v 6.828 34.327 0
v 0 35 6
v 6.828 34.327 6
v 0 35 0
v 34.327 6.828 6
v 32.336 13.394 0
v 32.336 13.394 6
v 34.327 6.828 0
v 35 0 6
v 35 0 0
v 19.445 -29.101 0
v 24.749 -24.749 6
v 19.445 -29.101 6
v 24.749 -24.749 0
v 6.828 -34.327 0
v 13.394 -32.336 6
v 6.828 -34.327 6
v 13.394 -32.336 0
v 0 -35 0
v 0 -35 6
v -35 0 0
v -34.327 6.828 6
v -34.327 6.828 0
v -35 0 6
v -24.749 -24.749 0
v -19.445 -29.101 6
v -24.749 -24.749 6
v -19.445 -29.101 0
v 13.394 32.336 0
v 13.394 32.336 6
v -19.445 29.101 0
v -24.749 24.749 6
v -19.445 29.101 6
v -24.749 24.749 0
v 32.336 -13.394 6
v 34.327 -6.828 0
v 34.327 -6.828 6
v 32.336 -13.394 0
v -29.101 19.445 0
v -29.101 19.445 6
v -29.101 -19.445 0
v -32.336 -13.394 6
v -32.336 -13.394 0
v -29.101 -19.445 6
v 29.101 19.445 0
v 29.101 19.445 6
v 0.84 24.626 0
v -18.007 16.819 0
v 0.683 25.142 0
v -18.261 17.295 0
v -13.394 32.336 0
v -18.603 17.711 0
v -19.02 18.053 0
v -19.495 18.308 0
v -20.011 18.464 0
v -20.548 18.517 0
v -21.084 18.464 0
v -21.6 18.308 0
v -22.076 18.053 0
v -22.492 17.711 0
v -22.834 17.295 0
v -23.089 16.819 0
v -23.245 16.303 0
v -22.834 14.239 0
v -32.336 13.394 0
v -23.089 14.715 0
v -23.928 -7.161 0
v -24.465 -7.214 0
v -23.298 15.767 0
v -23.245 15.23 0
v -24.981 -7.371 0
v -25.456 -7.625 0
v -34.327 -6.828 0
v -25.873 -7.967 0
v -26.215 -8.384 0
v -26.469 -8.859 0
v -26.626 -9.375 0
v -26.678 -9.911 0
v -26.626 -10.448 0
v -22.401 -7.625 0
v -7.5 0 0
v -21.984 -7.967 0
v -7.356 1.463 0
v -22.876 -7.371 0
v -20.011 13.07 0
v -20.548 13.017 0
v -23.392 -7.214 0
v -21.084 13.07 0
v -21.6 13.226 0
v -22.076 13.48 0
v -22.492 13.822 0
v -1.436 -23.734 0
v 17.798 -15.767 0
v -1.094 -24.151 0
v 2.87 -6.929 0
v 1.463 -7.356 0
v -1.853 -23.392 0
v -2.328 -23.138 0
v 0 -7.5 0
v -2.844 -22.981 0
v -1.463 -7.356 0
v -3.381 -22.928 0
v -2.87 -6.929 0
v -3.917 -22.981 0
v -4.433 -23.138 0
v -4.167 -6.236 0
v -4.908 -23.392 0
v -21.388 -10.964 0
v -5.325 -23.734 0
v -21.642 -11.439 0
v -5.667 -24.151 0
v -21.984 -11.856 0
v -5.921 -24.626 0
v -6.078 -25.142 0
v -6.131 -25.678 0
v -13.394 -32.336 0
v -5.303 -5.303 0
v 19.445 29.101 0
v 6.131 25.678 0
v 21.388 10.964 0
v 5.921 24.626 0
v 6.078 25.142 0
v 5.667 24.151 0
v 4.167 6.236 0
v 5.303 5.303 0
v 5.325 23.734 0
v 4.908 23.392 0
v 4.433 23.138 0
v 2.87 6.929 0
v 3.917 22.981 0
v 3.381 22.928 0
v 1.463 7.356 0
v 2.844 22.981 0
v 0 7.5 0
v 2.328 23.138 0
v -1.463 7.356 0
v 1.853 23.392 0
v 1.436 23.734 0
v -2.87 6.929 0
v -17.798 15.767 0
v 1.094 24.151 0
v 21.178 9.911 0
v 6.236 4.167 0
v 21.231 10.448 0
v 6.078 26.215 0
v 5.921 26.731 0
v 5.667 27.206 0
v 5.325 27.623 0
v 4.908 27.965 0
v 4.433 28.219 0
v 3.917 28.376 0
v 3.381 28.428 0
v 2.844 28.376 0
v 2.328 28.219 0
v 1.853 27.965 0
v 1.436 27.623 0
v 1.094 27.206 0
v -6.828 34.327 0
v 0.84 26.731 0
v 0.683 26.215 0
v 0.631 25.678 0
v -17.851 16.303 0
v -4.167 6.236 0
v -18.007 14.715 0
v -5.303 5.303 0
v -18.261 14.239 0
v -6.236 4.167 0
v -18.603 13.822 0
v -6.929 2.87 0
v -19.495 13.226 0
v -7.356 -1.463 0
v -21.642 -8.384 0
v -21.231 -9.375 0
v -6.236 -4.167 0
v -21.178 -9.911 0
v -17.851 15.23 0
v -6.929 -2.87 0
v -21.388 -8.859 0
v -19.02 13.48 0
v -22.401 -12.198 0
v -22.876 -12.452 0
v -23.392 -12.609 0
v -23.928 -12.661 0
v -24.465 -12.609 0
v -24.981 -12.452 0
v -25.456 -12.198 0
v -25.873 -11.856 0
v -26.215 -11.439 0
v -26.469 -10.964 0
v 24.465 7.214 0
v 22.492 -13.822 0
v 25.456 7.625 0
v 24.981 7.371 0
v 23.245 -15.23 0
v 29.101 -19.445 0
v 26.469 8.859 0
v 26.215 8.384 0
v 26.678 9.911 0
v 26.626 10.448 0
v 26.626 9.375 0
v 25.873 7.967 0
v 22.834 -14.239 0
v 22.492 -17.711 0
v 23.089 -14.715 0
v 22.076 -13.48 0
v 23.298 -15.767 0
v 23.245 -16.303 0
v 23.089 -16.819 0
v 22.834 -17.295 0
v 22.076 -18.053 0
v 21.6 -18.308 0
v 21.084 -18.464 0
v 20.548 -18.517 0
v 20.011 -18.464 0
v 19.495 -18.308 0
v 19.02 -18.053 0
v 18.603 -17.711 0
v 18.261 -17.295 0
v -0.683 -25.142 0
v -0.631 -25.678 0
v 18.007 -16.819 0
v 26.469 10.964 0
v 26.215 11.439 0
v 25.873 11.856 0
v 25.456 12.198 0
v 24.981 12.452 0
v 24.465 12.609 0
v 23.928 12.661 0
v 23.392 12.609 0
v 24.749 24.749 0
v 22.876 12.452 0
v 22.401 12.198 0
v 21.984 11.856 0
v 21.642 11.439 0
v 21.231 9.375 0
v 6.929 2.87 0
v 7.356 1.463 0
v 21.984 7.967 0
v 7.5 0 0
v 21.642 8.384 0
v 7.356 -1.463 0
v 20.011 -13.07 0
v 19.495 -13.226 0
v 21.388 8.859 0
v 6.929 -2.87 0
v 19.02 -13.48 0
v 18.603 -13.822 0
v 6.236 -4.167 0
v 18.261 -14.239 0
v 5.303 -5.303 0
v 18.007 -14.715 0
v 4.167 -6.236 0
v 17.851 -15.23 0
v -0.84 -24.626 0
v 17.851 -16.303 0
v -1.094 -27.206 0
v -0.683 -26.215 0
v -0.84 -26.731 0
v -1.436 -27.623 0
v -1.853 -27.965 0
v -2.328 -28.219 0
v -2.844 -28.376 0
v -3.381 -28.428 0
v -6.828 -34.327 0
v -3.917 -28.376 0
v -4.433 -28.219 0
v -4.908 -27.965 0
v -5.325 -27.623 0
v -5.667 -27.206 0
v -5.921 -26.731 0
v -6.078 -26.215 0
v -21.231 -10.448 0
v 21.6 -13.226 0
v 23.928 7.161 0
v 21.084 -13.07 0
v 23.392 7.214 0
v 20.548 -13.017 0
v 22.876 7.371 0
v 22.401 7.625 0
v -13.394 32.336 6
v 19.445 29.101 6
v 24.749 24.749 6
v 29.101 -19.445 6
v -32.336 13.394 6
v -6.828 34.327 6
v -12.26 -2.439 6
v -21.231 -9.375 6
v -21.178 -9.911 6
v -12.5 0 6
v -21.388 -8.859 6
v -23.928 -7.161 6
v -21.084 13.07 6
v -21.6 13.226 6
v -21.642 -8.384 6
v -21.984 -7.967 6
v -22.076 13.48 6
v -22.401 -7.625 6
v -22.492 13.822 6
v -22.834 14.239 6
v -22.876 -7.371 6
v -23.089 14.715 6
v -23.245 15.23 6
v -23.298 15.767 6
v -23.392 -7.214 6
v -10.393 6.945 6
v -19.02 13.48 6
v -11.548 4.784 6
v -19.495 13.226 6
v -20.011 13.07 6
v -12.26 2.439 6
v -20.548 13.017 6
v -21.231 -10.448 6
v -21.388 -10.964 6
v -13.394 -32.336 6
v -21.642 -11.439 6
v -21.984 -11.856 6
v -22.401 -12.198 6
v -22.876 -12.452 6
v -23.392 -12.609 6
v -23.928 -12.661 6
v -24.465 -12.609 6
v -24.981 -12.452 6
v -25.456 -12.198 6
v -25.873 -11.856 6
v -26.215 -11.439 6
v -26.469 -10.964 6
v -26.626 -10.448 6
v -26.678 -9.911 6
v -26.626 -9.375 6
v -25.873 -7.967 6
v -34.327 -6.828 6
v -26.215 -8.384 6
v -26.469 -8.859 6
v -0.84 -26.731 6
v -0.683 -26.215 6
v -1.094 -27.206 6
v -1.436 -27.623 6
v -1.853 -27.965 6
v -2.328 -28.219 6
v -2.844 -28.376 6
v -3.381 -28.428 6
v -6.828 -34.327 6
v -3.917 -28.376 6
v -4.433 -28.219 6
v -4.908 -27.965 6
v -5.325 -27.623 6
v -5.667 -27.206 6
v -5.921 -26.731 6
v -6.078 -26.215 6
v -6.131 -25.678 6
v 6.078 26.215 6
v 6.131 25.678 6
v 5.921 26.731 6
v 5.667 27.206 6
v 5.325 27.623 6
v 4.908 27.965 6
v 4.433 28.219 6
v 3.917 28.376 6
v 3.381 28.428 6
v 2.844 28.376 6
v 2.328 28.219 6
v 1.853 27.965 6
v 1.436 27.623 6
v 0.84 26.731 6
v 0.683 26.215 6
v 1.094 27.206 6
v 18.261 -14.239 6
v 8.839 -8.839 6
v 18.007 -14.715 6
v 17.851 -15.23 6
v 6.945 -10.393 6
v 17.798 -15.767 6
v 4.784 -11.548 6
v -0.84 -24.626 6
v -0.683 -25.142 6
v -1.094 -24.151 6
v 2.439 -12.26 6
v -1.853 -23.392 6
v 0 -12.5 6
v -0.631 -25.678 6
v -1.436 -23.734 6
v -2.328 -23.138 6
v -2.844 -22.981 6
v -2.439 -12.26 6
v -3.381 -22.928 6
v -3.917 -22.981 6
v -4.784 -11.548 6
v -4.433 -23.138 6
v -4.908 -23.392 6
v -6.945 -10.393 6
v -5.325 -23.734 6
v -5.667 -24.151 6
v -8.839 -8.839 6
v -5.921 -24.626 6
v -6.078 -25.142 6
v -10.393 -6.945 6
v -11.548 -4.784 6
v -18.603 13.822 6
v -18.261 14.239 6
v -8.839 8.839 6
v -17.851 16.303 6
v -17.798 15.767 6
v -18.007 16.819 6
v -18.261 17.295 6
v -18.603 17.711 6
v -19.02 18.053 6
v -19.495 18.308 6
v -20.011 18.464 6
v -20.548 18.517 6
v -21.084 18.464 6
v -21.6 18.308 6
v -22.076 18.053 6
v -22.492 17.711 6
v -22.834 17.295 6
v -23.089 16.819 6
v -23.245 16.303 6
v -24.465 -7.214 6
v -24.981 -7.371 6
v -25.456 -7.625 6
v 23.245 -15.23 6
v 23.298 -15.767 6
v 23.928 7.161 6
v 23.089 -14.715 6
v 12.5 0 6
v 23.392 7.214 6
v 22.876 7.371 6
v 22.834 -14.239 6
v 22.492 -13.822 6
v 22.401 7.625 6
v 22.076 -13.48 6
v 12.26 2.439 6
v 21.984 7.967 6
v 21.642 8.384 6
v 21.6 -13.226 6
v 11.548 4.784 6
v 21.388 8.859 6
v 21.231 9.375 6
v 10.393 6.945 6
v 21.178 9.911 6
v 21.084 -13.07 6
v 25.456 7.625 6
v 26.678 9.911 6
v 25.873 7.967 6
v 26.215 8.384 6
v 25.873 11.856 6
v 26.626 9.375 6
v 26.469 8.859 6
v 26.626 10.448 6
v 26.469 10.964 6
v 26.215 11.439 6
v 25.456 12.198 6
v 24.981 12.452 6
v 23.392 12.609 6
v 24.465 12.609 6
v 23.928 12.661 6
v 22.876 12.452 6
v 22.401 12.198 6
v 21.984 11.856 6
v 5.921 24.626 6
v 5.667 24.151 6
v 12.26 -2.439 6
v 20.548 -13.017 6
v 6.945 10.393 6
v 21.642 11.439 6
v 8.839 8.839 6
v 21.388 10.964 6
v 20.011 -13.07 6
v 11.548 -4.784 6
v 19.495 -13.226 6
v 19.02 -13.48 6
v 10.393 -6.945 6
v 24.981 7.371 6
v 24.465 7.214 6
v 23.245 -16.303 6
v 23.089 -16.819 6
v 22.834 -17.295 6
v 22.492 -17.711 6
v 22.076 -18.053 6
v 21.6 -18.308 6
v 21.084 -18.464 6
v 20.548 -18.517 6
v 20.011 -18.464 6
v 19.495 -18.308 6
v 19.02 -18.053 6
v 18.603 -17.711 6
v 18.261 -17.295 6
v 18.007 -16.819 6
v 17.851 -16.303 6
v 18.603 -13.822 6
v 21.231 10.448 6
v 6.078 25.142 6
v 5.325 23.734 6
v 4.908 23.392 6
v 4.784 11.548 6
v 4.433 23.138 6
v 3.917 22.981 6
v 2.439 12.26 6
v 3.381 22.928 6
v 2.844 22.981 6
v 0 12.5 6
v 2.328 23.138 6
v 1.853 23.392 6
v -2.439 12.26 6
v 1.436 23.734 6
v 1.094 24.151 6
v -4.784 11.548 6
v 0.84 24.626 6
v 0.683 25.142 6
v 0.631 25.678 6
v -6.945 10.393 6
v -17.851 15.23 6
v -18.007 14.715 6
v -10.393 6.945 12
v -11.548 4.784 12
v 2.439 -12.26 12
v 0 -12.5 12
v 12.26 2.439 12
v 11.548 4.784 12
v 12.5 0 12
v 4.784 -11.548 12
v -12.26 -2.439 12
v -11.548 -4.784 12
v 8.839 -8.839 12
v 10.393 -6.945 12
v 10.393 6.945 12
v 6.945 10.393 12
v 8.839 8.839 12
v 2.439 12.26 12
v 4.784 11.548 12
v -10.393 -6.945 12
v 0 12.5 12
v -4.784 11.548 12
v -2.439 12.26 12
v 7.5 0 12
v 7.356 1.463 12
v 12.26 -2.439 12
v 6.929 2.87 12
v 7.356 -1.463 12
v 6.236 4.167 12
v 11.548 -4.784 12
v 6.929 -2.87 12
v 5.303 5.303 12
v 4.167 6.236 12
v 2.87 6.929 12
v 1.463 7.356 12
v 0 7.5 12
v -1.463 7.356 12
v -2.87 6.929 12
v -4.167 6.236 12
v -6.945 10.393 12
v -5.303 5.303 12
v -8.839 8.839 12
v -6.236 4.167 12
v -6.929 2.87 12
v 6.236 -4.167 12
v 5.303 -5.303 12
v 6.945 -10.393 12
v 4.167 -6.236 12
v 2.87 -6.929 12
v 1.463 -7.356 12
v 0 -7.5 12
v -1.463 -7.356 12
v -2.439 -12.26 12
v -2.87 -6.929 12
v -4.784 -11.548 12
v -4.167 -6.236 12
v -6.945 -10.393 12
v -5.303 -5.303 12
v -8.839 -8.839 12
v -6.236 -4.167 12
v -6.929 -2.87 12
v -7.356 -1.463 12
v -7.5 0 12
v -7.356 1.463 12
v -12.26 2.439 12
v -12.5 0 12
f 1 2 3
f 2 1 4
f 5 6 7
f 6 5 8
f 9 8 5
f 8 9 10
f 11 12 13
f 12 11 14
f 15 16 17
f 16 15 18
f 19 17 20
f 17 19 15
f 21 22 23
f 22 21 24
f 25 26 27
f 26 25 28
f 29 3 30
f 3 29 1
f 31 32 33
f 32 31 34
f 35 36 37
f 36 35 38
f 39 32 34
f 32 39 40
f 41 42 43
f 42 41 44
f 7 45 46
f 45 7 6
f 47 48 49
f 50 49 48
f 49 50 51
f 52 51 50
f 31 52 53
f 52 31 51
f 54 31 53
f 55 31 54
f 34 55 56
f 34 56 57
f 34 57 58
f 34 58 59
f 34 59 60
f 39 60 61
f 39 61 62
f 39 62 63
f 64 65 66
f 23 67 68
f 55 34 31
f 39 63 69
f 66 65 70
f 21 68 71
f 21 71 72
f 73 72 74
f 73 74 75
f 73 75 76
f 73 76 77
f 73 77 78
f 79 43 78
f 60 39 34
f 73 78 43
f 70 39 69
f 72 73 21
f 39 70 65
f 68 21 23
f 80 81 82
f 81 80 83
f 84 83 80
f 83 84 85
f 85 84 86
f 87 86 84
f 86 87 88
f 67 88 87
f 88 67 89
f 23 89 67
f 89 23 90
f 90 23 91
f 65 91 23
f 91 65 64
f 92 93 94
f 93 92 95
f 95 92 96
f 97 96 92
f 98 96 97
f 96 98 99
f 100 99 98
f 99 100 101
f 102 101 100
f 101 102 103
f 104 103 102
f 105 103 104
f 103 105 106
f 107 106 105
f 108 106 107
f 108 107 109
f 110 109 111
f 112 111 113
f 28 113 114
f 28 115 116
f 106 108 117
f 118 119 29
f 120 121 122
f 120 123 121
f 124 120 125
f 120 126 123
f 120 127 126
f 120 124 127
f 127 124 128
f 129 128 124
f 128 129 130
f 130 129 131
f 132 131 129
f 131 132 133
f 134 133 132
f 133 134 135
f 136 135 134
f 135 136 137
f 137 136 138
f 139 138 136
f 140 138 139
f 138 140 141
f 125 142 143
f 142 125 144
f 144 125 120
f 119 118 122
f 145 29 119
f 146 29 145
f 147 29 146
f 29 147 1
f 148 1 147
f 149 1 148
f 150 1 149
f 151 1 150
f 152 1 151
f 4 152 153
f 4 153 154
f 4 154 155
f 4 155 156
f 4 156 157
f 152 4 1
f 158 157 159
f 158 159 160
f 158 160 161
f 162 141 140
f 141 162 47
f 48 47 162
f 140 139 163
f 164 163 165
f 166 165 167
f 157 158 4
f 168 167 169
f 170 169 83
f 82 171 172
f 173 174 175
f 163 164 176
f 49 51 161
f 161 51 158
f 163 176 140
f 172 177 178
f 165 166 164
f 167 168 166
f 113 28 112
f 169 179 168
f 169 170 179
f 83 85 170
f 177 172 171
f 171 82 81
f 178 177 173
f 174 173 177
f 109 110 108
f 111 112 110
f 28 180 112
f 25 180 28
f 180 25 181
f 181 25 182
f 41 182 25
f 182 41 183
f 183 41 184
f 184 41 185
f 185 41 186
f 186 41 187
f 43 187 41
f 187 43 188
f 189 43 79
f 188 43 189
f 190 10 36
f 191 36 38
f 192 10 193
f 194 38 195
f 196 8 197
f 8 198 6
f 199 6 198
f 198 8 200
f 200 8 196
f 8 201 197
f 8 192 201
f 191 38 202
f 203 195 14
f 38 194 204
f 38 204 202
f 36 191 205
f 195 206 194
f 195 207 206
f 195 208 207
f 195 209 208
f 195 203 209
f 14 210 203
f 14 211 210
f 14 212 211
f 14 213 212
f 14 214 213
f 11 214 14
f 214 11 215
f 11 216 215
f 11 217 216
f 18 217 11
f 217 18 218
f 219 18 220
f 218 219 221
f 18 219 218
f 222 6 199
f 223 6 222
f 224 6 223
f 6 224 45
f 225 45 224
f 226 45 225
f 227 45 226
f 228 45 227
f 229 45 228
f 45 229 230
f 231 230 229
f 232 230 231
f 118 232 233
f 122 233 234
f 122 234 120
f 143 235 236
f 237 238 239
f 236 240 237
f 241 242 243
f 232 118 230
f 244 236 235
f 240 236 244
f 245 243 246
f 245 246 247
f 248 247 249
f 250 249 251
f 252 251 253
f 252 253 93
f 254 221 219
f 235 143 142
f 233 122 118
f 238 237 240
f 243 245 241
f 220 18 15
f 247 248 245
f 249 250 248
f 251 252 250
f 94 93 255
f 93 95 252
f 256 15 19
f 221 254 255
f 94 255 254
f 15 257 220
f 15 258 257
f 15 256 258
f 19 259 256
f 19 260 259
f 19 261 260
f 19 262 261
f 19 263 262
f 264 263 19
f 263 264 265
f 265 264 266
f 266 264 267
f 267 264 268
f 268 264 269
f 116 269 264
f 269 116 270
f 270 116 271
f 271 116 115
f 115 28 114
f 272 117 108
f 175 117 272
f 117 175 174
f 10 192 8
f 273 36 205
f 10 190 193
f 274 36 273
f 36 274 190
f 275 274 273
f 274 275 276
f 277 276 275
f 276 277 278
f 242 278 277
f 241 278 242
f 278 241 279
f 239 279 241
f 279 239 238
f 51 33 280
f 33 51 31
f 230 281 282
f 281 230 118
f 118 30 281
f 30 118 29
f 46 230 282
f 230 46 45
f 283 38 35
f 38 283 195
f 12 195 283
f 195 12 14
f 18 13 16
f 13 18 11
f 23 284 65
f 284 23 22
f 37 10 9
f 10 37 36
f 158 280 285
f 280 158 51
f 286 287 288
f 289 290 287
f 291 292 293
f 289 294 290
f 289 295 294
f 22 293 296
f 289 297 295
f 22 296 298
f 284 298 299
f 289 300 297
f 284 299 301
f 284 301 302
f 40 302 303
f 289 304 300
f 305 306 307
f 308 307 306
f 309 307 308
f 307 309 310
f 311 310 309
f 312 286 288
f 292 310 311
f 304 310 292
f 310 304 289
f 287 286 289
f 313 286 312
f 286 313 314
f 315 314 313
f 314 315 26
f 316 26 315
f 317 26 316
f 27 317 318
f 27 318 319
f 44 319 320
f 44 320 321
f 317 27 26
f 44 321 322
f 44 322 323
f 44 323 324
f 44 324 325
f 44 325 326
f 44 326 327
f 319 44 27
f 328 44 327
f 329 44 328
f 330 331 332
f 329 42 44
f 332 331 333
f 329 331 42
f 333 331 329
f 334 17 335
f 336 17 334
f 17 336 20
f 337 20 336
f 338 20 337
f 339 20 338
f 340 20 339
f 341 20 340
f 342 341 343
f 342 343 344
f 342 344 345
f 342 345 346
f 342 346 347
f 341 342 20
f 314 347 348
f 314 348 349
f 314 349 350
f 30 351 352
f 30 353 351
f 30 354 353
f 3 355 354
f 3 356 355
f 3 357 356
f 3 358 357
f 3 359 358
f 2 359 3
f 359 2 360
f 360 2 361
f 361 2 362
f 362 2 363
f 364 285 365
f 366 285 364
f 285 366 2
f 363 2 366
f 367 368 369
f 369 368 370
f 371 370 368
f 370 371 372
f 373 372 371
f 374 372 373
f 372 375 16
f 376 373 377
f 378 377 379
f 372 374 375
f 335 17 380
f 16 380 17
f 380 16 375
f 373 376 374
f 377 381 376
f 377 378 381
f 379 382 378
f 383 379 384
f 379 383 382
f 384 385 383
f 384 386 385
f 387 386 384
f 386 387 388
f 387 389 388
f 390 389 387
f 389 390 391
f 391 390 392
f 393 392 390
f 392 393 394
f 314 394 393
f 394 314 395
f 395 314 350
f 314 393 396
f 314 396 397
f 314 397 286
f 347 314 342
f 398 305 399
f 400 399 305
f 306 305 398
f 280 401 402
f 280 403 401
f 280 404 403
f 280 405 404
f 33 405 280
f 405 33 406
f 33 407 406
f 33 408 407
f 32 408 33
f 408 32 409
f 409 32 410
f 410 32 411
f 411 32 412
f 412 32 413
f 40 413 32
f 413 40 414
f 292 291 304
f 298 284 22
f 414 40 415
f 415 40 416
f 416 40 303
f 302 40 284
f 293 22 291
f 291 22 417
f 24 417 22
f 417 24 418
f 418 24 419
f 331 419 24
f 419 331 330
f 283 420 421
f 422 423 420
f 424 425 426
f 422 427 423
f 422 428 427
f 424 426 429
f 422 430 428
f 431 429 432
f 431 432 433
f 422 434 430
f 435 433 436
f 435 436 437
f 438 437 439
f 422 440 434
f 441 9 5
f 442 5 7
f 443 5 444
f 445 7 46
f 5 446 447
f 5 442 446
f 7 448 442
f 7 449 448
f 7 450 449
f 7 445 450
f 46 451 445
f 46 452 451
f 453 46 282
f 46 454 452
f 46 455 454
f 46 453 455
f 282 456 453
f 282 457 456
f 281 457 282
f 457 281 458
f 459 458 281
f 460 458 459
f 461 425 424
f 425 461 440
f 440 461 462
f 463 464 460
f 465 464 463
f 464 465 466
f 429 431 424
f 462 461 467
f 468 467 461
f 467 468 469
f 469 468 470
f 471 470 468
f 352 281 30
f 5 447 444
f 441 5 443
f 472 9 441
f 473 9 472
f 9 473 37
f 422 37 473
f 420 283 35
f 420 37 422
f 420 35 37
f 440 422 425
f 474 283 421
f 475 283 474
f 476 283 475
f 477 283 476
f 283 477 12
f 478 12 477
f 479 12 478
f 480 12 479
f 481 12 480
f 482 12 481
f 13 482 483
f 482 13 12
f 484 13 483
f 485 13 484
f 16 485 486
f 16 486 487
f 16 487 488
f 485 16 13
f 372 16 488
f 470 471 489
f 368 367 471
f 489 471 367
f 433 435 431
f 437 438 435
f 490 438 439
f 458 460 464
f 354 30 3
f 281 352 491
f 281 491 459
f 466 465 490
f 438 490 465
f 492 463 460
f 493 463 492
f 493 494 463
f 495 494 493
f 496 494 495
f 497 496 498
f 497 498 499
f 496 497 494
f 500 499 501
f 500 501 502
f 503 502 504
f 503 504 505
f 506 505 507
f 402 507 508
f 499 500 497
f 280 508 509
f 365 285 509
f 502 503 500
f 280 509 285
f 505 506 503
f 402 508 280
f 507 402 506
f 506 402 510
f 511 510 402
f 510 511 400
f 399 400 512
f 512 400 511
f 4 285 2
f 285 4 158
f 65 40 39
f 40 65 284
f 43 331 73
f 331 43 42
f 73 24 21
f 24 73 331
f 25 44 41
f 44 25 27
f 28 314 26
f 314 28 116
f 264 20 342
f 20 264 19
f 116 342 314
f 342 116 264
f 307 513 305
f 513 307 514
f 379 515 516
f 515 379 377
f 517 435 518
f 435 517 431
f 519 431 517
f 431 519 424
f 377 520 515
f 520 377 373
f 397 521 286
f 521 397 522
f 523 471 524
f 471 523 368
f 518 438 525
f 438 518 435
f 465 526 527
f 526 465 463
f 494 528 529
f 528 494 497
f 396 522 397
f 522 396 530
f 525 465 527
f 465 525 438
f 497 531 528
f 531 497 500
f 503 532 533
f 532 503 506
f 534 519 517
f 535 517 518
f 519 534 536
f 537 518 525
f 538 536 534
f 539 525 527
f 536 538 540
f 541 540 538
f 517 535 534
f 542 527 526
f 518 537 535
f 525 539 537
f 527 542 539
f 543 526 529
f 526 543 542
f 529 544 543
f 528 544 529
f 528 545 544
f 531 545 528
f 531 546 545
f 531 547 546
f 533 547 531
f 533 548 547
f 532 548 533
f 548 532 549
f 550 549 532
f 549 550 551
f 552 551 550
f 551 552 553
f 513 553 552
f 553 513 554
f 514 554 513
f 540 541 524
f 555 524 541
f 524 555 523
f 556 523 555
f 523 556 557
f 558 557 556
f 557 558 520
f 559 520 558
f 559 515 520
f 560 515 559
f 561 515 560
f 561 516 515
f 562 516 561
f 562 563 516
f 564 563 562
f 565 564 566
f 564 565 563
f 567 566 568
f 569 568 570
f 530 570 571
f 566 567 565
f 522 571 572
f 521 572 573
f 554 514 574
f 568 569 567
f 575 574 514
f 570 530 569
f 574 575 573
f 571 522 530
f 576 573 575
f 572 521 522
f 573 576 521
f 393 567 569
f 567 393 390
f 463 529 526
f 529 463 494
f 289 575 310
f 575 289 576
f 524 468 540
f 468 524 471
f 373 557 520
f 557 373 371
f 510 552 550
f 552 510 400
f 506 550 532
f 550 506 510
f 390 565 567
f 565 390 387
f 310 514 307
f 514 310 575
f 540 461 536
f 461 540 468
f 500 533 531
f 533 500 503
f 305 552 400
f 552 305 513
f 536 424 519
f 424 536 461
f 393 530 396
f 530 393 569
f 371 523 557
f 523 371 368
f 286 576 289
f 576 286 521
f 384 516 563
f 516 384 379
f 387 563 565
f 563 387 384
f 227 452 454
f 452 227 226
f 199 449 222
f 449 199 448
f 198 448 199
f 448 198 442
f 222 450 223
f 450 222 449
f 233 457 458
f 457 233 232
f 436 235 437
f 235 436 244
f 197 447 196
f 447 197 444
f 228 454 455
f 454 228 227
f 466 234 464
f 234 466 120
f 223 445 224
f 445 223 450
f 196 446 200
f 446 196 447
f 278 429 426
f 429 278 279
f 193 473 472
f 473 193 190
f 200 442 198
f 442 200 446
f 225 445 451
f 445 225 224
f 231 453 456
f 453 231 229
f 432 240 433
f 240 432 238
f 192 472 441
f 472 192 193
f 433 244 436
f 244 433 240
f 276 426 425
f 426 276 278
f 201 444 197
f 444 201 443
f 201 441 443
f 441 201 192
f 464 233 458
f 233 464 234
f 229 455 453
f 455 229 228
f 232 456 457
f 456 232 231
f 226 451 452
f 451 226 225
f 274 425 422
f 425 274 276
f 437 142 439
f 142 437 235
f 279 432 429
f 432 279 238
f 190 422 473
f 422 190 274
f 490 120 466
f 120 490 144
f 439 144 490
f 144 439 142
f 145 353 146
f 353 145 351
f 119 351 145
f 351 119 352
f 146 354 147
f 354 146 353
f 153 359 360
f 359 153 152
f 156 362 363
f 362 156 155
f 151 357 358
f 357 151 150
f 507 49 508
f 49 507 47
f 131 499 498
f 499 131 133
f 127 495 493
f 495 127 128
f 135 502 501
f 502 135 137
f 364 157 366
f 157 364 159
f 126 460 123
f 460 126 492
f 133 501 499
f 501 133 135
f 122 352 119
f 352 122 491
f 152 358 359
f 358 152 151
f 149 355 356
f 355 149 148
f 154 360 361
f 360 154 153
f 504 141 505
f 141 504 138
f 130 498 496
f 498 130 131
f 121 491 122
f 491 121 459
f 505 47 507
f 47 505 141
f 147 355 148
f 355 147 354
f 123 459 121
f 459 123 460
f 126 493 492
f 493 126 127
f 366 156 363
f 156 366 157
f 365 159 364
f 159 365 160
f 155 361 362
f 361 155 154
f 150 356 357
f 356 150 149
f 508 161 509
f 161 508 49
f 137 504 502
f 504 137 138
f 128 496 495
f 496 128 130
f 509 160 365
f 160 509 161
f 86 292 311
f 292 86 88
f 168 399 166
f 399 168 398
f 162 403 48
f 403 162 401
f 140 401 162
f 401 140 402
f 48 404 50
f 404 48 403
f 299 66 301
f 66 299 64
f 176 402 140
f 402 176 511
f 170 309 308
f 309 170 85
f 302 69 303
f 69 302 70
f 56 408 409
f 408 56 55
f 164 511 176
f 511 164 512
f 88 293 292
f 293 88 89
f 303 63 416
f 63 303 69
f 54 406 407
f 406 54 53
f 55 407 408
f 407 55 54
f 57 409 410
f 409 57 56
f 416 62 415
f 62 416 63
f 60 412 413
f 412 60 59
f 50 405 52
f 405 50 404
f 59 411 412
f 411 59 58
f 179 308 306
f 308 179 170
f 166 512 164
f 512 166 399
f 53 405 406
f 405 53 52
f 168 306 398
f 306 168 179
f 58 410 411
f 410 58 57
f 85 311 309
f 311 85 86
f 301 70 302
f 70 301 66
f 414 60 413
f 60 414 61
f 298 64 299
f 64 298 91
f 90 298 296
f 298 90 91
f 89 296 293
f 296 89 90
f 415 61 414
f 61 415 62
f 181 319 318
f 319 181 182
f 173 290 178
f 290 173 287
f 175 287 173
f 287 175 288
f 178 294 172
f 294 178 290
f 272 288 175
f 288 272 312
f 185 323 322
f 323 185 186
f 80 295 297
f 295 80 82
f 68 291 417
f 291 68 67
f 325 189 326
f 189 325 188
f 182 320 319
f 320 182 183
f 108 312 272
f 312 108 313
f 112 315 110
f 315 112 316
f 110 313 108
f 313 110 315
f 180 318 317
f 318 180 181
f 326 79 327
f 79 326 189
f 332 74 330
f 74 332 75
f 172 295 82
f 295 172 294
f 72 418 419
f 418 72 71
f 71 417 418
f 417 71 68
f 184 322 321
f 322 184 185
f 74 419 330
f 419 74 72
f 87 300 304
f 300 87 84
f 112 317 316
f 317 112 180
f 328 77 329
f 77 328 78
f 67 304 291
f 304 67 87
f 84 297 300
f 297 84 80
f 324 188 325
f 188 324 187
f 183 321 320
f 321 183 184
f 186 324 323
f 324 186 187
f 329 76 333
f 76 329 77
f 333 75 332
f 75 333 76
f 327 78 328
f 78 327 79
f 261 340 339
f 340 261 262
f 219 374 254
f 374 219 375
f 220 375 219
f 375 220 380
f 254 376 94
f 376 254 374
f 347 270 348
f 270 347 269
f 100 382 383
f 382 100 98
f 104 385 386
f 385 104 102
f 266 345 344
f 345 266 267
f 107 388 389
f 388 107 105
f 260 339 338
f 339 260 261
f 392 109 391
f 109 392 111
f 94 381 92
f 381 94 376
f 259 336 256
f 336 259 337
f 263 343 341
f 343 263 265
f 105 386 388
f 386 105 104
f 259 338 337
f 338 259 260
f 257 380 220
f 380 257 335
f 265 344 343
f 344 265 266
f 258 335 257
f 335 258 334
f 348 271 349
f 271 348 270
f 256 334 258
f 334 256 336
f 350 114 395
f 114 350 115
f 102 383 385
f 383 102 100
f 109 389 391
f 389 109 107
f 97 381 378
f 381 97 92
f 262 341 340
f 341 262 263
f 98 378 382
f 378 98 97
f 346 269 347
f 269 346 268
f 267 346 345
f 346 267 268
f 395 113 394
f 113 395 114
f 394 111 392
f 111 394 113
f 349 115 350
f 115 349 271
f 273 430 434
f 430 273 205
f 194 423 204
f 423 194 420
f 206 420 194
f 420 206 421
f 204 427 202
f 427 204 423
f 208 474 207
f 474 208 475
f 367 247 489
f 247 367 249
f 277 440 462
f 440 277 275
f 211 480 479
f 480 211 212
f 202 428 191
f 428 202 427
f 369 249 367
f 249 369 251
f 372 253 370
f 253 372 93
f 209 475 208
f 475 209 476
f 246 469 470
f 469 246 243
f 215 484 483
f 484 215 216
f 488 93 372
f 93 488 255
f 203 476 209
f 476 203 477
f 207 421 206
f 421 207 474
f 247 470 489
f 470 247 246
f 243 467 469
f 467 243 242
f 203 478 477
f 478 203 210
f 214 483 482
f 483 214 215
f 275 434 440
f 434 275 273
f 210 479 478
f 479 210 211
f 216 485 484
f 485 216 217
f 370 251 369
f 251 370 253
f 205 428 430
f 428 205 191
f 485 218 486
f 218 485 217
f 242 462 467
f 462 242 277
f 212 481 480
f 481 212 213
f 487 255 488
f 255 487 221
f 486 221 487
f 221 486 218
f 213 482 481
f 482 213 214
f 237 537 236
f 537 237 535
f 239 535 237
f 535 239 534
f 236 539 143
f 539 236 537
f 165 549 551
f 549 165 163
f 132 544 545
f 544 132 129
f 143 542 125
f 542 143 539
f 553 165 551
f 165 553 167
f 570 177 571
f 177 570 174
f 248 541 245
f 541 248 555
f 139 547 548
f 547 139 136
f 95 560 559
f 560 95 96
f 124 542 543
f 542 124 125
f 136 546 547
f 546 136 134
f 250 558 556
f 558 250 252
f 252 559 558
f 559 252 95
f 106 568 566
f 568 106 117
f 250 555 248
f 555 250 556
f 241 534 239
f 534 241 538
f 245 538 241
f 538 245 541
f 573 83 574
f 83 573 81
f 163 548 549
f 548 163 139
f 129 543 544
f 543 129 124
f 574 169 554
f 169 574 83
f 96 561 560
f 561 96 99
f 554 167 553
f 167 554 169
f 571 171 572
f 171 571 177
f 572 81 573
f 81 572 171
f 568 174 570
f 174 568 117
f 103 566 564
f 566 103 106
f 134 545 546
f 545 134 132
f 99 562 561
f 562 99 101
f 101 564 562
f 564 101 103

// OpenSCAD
$fn = 32;

// ----------------------------------------------------------------------
// Flange Ø70 x 6
// 6 holes on a Ø51.8 bolt circle, bolted joints
// ----------------------------------------------------------------------

// --- parameters (mm) ---
flange_d = 70;     // outside diameter of the flange
thickness = 6;     // flange thickness
holes = 6;         // number of bolt holes
pcd = 51.8;        // bolt circle diameter
start_deg = 22.5;  // angle of the first hole, from +X
hole_d = 5.5;      // bolt hole diameter
bore_d = 15;       // central through bore
hub_d = 25;        // hub outside diameter
hub_h = 6;         // hub height above the flange face (0 = no hub)

// --- derived feature positions (mm) ---
height = thickness + hub_h;  // = 12   overall height of the part
pcd_r = pcd / 2;             // = 25.9   bolt circle radius
hole_step = 360 / holes;     // = 60   angular pitch
feature_centers = [
  [pcd_r * cos(start_deg + 0 * hole_step), pcd_r * sin(start_deg + 0 * hole_step)],
  [pcd_r * cos(start_deg + 1 * hole_step), pcd_r * sin(start_deg + 1 * hole_step)],
  [pcd_r * cos(start_deg + 2 * hole_step), pcd_r * sin(start_deg + 2 * hole_step)],
  [pcd_r * cos(start_deg + 3 * hole_step), pcd_r * sin(start_deg + 3 * hole_step)],
  [pcd_r * cos(start_deg + 4 * hole_step), pcd_r * sin(start_deg + 4 * hole_step)],
  [pcd_r * cos(start_deg + 5 * hole_step), pcd_r * sin(start_deg + 5 * hole_step)]
];   // bolt hole centres on the pitch circle

// flange disc, every hole and the bore cut straight through
difference() {
  union() {
    cylinder(d = flange_d, h = thickness);
    cylinder(d = hub_d, h = height);  // hub, overlapped into the flange
  }
  translate([0, 0, -1]) cylinder(d = bore_d, h = height + 2);  // bore, through
  for (centre = feature_centers)
    translate([centre[0], centre[1], -1]) cylinder(d = hole_d, h = thickness + 2);
}
